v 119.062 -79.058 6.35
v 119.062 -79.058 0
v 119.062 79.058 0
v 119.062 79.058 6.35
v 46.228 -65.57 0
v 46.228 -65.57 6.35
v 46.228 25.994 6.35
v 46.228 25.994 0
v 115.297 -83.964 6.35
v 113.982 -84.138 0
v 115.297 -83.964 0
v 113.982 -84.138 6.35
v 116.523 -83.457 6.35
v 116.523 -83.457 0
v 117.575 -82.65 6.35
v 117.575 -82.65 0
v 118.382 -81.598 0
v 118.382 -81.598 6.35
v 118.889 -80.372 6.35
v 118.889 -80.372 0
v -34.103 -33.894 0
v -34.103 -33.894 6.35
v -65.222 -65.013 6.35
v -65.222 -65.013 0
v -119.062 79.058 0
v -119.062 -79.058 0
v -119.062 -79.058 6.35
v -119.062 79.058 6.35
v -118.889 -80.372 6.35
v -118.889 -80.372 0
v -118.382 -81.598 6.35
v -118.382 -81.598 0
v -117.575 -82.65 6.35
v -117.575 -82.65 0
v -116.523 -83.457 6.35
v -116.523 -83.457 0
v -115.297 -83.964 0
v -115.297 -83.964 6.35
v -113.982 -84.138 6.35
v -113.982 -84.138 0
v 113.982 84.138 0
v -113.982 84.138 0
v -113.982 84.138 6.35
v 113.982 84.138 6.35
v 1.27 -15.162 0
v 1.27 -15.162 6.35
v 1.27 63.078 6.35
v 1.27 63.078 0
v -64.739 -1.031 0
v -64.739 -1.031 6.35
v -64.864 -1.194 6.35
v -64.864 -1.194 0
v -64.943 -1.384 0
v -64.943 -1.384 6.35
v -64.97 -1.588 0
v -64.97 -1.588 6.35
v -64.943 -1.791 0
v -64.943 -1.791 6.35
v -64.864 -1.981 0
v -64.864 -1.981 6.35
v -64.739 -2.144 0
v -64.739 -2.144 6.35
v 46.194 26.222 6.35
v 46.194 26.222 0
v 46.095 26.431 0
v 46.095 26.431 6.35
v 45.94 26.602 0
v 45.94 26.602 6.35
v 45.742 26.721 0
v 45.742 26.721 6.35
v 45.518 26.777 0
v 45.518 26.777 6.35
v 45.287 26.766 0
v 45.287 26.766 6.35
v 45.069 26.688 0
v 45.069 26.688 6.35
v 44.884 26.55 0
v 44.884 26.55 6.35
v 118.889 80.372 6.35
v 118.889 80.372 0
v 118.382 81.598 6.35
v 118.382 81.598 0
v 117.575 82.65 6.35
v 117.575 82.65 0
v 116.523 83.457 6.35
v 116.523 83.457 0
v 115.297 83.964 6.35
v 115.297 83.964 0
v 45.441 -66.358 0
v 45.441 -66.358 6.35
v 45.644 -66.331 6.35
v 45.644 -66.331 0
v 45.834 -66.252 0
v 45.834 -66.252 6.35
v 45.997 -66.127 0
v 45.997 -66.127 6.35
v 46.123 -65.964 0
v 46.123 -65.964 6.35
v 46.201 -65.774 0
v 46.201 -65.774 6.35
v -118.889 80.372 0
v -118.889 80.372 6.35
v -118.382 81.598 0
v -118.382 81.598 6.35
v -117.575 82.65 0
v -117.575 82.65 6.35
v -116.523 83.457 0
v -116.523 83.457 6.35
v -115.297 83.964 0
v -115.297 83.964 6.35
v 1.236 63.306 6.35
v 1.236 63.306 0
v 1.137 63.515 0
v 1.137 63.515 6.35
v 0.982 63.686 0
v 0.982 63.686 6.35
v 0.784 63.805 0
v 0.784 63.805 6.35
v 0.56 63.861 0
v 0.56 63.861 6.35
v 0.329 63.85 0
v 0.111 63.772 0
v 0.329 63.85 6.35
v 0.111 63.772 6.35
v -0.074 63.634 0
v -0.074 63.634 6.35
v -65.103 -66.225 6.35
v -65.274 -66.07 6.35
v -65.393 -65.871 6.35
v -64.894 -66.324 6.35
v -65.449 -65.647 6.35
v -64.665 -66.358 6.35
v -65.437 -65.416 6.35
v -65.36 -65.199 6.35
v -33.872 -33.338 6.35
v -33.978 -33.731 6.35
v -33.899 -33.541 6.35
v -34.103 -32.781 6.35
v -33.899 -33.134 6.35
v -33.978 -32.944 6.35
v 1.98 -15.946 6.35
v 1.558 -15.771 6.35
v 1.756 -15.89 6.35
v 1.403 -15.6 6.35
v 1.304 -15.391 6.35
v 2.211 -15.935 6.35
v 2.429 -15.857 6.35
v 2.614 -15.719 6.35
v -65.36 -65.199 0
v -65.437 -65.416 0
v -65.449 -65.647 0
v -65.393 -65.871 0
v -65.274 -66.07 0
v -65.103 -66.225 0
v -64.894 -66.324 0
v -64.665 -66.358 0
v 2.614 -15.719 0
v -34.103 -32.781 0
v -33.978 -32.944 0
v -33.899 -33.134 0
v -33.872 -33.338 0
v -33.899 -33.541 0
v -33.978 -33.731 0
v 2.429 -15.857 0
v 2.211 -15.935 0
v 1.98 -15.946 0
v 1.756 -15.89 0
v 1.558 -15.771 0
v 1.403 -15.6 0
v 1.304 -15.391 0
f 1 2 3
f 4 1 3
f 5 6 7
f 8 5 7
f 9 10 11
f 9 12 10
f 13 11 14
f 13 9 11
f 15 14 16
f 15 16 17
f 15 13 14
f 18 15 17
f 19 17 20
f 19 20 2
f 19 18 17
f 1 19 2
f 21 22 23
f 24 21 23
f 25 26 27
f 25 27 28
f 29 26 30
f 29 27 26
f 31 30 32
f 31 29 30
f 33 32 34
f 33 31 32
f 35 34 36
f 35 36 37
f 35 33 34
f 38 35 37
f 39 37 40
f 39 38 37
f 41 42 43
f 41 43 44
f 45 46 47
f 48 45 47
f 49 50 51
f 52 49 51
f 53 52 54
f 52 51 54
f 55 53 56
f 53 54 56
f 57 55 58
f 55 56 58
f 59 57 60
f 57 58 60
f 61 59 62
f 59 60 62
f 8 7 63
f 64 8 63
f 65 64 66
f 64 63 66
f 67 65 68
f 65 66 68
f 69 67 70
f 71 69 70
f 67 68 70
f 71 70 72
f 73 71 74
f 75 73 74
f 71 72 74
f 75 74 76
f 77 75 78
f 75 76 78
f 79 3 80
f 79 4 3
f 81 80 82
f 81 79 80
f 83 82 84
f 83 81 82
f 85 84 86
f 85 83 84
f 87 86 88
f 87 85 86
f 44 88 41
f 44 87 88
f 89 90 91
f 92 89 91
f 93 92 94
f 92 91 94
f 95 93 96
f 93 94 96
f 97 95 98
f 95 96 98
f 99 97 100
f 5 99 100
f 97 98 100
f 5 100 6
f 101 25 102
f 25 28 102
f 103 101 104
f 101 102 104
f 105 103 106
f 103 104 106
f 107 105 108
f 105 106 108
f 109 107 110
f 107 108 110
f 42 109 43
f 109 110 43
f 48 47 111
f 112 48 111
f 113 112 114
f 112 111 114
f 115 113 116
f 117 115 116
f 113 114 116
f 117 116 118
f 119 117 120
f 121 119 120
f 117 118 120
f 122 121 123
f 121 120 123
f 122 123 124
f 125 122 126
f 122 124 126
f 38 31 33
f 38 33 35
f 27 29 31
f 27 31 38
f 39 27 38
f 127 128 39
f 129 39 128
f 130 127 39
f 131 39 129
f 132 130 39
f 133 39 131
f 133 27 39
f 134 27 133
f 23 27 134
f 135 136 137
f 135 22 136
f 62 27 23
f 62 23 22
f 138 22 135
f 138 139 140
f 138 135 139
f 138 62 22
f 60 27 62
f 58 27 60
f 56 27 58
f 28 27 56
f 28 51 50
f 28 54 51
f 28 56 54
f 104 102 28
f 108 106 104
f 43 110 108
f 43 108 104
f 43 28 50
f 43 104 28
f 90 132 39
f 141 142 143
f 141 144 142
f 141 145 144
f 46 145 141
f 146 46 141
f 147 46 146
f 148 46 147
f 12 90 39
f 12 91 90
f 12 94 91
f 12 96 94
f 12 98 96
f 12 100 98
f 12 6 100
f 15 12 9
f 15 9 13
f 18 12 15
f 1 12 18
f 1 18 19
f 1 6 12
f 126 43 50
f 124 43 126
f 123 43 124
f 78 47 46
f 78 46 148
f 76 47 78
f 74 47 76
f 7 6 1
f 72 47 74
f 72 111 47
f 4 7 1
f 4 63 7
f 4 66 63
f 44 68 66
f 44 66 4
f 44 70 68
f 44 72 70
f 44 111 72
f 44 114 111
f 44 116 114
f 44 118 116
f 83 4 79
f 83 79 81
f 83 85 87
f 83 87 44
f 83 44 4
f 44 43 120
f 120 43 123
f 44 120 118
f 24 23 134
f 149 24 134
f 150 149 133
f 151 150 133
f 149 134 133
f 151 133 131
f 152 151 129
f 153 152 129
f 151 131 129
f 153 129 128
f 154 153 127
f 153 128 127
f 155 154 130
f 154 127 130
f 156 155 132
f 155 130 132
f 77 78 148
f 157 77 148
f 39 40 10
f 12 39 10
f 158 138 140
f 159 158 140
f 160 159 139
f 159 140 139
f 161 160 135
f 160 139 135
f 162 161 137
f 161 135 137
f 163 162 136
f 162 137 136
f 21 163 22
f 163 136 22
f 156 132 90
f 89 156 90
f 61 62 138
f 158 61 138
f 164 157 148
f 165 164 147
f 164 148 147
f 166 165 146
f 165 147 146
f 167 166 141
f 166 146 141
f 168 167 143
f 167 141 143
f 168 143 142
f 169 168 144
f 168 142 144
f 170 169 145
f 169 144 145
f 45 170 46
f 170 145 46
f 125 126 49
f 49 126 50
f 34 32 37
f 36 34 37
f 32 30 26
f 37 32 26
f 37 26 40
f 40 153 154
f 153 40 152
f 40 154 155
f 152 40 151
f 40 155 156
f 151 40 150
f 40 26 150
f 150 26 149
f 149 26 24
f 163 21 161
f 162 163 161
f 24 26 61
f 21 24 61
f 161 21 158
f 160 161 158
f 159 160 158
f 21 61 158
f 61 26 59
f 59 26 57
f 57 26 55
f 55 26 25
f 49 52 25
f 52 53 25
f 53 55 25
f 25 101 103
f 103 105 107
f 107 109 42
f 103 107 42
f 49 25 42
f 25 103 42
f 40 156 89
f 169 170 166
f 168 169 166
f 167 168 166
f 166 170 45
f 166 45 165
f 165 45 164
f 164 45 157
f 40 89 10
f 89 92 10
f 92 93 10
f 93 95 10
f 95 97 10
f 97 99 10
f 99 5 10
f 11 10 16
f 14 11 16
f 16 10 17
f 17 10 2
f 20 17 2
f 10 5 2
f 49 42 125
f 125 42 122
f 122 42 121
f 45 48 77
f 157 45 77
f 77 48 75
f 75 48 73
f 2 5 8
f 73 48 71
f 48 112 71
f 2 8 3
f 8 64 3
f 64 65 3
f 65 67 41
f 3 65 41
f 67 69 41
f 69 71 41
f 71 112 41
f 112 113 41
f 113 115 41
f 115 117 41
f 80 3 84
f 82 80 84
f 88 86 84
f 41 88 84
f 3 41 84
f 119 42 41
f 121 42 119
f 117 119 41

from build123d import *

# Parameters (mm, degrees)
F0_W     = 238.125
F0_H     = 168.275
F1_DEPTH = 6.35
F2_R     = 5.08
F4_DEPTH = 25.4
F6_DEPTH = 6.351


with BuildPart() as f1:
    # F0 (on Top) → F1 (new body)
    with BuildSketch(Plane.XY):
        Rectangle(F0_W, F0_H)
    extrude(amount=F1_DEPTH)

    # F2
    f2_edges = [f1.edges().sort_by_distance(p)[0] for p in [
        (119.0625, -84.1375, 3.175),
        (-119.0625, -84.1375, 3.175),
        (119.0625, 84.1375, 3.175),
        (-119.0625, 84.1375, 3.175),
    ]]
    fillet(f2_edges, radius=F2_R)

    # F3 (on face) → F4 (cut)
    with BuildSketch(Plane.XY.offset(6.35)):
        Polygon((-31.75, -33.3375), (-63.5, -65.0875), (44.958, -65.0875), (44.958, 24.8285), (0, -20.1295), (0, 61.9125), (-63.5, -1.5875), align=None)
    extrude(amount=-F4_DEPTH, mode=Mode.SUBTRACT)

    # F5 (on face) → F6 (cut, through all)
    with BuildSketch(Plane.XY.offset(6.35)):
        with BuildLine():
            ThreePointArc((46.228, 25.993599), (45.741925, 26.721062), (44.883824, 26.550375))
            Line((44.883824, 26.550375), (2.614176, -15.719273))
            ThreePointArc((2.614176, -15.719273), (1.756075, -15.88996), (1.27, -15.162497))
            Line((1.27, -15.162497), (1.27, 63.077599))
            ThreePointArc((1.27, 63.077599), (0.783925, 63.805062), (-0.074176, 63.634375))
            Line((-0.074176, 63.634375), (-64.739275, -1.030724))
            ThreePointArc((-64.739275, -1.030724), (-64.969899, -1.5875), (-64.739275, -2.144276))
            Line((-64.739275, -2.144276), (-34.102827, -32.780724))
            ThreePointArc((-34.102827, -32.780724), (-33.872203, -33.3375), (-34.102827, -33.894276))
            Line((-34.102827, -33.894276), (-65.221875, -65.013324))
            ThreePointArc((-65.221875, -65.013324), (-65.392562, -65.871425), (-64.665099, -66.3575))
            Line((-64.665099, -66.3575), (45.4406, -66.3575))
            ThreePointArc((45.4406, -66.3575), (45.997376, -66.126876), (46.228, -65.5701))
            Line((46.228, -65.5701), (46.228, 25.993599))
        make_face()
    extrude(amount=-F6_DEPTH, mode=Mode.SUBTRACT)


solid = f1.part
